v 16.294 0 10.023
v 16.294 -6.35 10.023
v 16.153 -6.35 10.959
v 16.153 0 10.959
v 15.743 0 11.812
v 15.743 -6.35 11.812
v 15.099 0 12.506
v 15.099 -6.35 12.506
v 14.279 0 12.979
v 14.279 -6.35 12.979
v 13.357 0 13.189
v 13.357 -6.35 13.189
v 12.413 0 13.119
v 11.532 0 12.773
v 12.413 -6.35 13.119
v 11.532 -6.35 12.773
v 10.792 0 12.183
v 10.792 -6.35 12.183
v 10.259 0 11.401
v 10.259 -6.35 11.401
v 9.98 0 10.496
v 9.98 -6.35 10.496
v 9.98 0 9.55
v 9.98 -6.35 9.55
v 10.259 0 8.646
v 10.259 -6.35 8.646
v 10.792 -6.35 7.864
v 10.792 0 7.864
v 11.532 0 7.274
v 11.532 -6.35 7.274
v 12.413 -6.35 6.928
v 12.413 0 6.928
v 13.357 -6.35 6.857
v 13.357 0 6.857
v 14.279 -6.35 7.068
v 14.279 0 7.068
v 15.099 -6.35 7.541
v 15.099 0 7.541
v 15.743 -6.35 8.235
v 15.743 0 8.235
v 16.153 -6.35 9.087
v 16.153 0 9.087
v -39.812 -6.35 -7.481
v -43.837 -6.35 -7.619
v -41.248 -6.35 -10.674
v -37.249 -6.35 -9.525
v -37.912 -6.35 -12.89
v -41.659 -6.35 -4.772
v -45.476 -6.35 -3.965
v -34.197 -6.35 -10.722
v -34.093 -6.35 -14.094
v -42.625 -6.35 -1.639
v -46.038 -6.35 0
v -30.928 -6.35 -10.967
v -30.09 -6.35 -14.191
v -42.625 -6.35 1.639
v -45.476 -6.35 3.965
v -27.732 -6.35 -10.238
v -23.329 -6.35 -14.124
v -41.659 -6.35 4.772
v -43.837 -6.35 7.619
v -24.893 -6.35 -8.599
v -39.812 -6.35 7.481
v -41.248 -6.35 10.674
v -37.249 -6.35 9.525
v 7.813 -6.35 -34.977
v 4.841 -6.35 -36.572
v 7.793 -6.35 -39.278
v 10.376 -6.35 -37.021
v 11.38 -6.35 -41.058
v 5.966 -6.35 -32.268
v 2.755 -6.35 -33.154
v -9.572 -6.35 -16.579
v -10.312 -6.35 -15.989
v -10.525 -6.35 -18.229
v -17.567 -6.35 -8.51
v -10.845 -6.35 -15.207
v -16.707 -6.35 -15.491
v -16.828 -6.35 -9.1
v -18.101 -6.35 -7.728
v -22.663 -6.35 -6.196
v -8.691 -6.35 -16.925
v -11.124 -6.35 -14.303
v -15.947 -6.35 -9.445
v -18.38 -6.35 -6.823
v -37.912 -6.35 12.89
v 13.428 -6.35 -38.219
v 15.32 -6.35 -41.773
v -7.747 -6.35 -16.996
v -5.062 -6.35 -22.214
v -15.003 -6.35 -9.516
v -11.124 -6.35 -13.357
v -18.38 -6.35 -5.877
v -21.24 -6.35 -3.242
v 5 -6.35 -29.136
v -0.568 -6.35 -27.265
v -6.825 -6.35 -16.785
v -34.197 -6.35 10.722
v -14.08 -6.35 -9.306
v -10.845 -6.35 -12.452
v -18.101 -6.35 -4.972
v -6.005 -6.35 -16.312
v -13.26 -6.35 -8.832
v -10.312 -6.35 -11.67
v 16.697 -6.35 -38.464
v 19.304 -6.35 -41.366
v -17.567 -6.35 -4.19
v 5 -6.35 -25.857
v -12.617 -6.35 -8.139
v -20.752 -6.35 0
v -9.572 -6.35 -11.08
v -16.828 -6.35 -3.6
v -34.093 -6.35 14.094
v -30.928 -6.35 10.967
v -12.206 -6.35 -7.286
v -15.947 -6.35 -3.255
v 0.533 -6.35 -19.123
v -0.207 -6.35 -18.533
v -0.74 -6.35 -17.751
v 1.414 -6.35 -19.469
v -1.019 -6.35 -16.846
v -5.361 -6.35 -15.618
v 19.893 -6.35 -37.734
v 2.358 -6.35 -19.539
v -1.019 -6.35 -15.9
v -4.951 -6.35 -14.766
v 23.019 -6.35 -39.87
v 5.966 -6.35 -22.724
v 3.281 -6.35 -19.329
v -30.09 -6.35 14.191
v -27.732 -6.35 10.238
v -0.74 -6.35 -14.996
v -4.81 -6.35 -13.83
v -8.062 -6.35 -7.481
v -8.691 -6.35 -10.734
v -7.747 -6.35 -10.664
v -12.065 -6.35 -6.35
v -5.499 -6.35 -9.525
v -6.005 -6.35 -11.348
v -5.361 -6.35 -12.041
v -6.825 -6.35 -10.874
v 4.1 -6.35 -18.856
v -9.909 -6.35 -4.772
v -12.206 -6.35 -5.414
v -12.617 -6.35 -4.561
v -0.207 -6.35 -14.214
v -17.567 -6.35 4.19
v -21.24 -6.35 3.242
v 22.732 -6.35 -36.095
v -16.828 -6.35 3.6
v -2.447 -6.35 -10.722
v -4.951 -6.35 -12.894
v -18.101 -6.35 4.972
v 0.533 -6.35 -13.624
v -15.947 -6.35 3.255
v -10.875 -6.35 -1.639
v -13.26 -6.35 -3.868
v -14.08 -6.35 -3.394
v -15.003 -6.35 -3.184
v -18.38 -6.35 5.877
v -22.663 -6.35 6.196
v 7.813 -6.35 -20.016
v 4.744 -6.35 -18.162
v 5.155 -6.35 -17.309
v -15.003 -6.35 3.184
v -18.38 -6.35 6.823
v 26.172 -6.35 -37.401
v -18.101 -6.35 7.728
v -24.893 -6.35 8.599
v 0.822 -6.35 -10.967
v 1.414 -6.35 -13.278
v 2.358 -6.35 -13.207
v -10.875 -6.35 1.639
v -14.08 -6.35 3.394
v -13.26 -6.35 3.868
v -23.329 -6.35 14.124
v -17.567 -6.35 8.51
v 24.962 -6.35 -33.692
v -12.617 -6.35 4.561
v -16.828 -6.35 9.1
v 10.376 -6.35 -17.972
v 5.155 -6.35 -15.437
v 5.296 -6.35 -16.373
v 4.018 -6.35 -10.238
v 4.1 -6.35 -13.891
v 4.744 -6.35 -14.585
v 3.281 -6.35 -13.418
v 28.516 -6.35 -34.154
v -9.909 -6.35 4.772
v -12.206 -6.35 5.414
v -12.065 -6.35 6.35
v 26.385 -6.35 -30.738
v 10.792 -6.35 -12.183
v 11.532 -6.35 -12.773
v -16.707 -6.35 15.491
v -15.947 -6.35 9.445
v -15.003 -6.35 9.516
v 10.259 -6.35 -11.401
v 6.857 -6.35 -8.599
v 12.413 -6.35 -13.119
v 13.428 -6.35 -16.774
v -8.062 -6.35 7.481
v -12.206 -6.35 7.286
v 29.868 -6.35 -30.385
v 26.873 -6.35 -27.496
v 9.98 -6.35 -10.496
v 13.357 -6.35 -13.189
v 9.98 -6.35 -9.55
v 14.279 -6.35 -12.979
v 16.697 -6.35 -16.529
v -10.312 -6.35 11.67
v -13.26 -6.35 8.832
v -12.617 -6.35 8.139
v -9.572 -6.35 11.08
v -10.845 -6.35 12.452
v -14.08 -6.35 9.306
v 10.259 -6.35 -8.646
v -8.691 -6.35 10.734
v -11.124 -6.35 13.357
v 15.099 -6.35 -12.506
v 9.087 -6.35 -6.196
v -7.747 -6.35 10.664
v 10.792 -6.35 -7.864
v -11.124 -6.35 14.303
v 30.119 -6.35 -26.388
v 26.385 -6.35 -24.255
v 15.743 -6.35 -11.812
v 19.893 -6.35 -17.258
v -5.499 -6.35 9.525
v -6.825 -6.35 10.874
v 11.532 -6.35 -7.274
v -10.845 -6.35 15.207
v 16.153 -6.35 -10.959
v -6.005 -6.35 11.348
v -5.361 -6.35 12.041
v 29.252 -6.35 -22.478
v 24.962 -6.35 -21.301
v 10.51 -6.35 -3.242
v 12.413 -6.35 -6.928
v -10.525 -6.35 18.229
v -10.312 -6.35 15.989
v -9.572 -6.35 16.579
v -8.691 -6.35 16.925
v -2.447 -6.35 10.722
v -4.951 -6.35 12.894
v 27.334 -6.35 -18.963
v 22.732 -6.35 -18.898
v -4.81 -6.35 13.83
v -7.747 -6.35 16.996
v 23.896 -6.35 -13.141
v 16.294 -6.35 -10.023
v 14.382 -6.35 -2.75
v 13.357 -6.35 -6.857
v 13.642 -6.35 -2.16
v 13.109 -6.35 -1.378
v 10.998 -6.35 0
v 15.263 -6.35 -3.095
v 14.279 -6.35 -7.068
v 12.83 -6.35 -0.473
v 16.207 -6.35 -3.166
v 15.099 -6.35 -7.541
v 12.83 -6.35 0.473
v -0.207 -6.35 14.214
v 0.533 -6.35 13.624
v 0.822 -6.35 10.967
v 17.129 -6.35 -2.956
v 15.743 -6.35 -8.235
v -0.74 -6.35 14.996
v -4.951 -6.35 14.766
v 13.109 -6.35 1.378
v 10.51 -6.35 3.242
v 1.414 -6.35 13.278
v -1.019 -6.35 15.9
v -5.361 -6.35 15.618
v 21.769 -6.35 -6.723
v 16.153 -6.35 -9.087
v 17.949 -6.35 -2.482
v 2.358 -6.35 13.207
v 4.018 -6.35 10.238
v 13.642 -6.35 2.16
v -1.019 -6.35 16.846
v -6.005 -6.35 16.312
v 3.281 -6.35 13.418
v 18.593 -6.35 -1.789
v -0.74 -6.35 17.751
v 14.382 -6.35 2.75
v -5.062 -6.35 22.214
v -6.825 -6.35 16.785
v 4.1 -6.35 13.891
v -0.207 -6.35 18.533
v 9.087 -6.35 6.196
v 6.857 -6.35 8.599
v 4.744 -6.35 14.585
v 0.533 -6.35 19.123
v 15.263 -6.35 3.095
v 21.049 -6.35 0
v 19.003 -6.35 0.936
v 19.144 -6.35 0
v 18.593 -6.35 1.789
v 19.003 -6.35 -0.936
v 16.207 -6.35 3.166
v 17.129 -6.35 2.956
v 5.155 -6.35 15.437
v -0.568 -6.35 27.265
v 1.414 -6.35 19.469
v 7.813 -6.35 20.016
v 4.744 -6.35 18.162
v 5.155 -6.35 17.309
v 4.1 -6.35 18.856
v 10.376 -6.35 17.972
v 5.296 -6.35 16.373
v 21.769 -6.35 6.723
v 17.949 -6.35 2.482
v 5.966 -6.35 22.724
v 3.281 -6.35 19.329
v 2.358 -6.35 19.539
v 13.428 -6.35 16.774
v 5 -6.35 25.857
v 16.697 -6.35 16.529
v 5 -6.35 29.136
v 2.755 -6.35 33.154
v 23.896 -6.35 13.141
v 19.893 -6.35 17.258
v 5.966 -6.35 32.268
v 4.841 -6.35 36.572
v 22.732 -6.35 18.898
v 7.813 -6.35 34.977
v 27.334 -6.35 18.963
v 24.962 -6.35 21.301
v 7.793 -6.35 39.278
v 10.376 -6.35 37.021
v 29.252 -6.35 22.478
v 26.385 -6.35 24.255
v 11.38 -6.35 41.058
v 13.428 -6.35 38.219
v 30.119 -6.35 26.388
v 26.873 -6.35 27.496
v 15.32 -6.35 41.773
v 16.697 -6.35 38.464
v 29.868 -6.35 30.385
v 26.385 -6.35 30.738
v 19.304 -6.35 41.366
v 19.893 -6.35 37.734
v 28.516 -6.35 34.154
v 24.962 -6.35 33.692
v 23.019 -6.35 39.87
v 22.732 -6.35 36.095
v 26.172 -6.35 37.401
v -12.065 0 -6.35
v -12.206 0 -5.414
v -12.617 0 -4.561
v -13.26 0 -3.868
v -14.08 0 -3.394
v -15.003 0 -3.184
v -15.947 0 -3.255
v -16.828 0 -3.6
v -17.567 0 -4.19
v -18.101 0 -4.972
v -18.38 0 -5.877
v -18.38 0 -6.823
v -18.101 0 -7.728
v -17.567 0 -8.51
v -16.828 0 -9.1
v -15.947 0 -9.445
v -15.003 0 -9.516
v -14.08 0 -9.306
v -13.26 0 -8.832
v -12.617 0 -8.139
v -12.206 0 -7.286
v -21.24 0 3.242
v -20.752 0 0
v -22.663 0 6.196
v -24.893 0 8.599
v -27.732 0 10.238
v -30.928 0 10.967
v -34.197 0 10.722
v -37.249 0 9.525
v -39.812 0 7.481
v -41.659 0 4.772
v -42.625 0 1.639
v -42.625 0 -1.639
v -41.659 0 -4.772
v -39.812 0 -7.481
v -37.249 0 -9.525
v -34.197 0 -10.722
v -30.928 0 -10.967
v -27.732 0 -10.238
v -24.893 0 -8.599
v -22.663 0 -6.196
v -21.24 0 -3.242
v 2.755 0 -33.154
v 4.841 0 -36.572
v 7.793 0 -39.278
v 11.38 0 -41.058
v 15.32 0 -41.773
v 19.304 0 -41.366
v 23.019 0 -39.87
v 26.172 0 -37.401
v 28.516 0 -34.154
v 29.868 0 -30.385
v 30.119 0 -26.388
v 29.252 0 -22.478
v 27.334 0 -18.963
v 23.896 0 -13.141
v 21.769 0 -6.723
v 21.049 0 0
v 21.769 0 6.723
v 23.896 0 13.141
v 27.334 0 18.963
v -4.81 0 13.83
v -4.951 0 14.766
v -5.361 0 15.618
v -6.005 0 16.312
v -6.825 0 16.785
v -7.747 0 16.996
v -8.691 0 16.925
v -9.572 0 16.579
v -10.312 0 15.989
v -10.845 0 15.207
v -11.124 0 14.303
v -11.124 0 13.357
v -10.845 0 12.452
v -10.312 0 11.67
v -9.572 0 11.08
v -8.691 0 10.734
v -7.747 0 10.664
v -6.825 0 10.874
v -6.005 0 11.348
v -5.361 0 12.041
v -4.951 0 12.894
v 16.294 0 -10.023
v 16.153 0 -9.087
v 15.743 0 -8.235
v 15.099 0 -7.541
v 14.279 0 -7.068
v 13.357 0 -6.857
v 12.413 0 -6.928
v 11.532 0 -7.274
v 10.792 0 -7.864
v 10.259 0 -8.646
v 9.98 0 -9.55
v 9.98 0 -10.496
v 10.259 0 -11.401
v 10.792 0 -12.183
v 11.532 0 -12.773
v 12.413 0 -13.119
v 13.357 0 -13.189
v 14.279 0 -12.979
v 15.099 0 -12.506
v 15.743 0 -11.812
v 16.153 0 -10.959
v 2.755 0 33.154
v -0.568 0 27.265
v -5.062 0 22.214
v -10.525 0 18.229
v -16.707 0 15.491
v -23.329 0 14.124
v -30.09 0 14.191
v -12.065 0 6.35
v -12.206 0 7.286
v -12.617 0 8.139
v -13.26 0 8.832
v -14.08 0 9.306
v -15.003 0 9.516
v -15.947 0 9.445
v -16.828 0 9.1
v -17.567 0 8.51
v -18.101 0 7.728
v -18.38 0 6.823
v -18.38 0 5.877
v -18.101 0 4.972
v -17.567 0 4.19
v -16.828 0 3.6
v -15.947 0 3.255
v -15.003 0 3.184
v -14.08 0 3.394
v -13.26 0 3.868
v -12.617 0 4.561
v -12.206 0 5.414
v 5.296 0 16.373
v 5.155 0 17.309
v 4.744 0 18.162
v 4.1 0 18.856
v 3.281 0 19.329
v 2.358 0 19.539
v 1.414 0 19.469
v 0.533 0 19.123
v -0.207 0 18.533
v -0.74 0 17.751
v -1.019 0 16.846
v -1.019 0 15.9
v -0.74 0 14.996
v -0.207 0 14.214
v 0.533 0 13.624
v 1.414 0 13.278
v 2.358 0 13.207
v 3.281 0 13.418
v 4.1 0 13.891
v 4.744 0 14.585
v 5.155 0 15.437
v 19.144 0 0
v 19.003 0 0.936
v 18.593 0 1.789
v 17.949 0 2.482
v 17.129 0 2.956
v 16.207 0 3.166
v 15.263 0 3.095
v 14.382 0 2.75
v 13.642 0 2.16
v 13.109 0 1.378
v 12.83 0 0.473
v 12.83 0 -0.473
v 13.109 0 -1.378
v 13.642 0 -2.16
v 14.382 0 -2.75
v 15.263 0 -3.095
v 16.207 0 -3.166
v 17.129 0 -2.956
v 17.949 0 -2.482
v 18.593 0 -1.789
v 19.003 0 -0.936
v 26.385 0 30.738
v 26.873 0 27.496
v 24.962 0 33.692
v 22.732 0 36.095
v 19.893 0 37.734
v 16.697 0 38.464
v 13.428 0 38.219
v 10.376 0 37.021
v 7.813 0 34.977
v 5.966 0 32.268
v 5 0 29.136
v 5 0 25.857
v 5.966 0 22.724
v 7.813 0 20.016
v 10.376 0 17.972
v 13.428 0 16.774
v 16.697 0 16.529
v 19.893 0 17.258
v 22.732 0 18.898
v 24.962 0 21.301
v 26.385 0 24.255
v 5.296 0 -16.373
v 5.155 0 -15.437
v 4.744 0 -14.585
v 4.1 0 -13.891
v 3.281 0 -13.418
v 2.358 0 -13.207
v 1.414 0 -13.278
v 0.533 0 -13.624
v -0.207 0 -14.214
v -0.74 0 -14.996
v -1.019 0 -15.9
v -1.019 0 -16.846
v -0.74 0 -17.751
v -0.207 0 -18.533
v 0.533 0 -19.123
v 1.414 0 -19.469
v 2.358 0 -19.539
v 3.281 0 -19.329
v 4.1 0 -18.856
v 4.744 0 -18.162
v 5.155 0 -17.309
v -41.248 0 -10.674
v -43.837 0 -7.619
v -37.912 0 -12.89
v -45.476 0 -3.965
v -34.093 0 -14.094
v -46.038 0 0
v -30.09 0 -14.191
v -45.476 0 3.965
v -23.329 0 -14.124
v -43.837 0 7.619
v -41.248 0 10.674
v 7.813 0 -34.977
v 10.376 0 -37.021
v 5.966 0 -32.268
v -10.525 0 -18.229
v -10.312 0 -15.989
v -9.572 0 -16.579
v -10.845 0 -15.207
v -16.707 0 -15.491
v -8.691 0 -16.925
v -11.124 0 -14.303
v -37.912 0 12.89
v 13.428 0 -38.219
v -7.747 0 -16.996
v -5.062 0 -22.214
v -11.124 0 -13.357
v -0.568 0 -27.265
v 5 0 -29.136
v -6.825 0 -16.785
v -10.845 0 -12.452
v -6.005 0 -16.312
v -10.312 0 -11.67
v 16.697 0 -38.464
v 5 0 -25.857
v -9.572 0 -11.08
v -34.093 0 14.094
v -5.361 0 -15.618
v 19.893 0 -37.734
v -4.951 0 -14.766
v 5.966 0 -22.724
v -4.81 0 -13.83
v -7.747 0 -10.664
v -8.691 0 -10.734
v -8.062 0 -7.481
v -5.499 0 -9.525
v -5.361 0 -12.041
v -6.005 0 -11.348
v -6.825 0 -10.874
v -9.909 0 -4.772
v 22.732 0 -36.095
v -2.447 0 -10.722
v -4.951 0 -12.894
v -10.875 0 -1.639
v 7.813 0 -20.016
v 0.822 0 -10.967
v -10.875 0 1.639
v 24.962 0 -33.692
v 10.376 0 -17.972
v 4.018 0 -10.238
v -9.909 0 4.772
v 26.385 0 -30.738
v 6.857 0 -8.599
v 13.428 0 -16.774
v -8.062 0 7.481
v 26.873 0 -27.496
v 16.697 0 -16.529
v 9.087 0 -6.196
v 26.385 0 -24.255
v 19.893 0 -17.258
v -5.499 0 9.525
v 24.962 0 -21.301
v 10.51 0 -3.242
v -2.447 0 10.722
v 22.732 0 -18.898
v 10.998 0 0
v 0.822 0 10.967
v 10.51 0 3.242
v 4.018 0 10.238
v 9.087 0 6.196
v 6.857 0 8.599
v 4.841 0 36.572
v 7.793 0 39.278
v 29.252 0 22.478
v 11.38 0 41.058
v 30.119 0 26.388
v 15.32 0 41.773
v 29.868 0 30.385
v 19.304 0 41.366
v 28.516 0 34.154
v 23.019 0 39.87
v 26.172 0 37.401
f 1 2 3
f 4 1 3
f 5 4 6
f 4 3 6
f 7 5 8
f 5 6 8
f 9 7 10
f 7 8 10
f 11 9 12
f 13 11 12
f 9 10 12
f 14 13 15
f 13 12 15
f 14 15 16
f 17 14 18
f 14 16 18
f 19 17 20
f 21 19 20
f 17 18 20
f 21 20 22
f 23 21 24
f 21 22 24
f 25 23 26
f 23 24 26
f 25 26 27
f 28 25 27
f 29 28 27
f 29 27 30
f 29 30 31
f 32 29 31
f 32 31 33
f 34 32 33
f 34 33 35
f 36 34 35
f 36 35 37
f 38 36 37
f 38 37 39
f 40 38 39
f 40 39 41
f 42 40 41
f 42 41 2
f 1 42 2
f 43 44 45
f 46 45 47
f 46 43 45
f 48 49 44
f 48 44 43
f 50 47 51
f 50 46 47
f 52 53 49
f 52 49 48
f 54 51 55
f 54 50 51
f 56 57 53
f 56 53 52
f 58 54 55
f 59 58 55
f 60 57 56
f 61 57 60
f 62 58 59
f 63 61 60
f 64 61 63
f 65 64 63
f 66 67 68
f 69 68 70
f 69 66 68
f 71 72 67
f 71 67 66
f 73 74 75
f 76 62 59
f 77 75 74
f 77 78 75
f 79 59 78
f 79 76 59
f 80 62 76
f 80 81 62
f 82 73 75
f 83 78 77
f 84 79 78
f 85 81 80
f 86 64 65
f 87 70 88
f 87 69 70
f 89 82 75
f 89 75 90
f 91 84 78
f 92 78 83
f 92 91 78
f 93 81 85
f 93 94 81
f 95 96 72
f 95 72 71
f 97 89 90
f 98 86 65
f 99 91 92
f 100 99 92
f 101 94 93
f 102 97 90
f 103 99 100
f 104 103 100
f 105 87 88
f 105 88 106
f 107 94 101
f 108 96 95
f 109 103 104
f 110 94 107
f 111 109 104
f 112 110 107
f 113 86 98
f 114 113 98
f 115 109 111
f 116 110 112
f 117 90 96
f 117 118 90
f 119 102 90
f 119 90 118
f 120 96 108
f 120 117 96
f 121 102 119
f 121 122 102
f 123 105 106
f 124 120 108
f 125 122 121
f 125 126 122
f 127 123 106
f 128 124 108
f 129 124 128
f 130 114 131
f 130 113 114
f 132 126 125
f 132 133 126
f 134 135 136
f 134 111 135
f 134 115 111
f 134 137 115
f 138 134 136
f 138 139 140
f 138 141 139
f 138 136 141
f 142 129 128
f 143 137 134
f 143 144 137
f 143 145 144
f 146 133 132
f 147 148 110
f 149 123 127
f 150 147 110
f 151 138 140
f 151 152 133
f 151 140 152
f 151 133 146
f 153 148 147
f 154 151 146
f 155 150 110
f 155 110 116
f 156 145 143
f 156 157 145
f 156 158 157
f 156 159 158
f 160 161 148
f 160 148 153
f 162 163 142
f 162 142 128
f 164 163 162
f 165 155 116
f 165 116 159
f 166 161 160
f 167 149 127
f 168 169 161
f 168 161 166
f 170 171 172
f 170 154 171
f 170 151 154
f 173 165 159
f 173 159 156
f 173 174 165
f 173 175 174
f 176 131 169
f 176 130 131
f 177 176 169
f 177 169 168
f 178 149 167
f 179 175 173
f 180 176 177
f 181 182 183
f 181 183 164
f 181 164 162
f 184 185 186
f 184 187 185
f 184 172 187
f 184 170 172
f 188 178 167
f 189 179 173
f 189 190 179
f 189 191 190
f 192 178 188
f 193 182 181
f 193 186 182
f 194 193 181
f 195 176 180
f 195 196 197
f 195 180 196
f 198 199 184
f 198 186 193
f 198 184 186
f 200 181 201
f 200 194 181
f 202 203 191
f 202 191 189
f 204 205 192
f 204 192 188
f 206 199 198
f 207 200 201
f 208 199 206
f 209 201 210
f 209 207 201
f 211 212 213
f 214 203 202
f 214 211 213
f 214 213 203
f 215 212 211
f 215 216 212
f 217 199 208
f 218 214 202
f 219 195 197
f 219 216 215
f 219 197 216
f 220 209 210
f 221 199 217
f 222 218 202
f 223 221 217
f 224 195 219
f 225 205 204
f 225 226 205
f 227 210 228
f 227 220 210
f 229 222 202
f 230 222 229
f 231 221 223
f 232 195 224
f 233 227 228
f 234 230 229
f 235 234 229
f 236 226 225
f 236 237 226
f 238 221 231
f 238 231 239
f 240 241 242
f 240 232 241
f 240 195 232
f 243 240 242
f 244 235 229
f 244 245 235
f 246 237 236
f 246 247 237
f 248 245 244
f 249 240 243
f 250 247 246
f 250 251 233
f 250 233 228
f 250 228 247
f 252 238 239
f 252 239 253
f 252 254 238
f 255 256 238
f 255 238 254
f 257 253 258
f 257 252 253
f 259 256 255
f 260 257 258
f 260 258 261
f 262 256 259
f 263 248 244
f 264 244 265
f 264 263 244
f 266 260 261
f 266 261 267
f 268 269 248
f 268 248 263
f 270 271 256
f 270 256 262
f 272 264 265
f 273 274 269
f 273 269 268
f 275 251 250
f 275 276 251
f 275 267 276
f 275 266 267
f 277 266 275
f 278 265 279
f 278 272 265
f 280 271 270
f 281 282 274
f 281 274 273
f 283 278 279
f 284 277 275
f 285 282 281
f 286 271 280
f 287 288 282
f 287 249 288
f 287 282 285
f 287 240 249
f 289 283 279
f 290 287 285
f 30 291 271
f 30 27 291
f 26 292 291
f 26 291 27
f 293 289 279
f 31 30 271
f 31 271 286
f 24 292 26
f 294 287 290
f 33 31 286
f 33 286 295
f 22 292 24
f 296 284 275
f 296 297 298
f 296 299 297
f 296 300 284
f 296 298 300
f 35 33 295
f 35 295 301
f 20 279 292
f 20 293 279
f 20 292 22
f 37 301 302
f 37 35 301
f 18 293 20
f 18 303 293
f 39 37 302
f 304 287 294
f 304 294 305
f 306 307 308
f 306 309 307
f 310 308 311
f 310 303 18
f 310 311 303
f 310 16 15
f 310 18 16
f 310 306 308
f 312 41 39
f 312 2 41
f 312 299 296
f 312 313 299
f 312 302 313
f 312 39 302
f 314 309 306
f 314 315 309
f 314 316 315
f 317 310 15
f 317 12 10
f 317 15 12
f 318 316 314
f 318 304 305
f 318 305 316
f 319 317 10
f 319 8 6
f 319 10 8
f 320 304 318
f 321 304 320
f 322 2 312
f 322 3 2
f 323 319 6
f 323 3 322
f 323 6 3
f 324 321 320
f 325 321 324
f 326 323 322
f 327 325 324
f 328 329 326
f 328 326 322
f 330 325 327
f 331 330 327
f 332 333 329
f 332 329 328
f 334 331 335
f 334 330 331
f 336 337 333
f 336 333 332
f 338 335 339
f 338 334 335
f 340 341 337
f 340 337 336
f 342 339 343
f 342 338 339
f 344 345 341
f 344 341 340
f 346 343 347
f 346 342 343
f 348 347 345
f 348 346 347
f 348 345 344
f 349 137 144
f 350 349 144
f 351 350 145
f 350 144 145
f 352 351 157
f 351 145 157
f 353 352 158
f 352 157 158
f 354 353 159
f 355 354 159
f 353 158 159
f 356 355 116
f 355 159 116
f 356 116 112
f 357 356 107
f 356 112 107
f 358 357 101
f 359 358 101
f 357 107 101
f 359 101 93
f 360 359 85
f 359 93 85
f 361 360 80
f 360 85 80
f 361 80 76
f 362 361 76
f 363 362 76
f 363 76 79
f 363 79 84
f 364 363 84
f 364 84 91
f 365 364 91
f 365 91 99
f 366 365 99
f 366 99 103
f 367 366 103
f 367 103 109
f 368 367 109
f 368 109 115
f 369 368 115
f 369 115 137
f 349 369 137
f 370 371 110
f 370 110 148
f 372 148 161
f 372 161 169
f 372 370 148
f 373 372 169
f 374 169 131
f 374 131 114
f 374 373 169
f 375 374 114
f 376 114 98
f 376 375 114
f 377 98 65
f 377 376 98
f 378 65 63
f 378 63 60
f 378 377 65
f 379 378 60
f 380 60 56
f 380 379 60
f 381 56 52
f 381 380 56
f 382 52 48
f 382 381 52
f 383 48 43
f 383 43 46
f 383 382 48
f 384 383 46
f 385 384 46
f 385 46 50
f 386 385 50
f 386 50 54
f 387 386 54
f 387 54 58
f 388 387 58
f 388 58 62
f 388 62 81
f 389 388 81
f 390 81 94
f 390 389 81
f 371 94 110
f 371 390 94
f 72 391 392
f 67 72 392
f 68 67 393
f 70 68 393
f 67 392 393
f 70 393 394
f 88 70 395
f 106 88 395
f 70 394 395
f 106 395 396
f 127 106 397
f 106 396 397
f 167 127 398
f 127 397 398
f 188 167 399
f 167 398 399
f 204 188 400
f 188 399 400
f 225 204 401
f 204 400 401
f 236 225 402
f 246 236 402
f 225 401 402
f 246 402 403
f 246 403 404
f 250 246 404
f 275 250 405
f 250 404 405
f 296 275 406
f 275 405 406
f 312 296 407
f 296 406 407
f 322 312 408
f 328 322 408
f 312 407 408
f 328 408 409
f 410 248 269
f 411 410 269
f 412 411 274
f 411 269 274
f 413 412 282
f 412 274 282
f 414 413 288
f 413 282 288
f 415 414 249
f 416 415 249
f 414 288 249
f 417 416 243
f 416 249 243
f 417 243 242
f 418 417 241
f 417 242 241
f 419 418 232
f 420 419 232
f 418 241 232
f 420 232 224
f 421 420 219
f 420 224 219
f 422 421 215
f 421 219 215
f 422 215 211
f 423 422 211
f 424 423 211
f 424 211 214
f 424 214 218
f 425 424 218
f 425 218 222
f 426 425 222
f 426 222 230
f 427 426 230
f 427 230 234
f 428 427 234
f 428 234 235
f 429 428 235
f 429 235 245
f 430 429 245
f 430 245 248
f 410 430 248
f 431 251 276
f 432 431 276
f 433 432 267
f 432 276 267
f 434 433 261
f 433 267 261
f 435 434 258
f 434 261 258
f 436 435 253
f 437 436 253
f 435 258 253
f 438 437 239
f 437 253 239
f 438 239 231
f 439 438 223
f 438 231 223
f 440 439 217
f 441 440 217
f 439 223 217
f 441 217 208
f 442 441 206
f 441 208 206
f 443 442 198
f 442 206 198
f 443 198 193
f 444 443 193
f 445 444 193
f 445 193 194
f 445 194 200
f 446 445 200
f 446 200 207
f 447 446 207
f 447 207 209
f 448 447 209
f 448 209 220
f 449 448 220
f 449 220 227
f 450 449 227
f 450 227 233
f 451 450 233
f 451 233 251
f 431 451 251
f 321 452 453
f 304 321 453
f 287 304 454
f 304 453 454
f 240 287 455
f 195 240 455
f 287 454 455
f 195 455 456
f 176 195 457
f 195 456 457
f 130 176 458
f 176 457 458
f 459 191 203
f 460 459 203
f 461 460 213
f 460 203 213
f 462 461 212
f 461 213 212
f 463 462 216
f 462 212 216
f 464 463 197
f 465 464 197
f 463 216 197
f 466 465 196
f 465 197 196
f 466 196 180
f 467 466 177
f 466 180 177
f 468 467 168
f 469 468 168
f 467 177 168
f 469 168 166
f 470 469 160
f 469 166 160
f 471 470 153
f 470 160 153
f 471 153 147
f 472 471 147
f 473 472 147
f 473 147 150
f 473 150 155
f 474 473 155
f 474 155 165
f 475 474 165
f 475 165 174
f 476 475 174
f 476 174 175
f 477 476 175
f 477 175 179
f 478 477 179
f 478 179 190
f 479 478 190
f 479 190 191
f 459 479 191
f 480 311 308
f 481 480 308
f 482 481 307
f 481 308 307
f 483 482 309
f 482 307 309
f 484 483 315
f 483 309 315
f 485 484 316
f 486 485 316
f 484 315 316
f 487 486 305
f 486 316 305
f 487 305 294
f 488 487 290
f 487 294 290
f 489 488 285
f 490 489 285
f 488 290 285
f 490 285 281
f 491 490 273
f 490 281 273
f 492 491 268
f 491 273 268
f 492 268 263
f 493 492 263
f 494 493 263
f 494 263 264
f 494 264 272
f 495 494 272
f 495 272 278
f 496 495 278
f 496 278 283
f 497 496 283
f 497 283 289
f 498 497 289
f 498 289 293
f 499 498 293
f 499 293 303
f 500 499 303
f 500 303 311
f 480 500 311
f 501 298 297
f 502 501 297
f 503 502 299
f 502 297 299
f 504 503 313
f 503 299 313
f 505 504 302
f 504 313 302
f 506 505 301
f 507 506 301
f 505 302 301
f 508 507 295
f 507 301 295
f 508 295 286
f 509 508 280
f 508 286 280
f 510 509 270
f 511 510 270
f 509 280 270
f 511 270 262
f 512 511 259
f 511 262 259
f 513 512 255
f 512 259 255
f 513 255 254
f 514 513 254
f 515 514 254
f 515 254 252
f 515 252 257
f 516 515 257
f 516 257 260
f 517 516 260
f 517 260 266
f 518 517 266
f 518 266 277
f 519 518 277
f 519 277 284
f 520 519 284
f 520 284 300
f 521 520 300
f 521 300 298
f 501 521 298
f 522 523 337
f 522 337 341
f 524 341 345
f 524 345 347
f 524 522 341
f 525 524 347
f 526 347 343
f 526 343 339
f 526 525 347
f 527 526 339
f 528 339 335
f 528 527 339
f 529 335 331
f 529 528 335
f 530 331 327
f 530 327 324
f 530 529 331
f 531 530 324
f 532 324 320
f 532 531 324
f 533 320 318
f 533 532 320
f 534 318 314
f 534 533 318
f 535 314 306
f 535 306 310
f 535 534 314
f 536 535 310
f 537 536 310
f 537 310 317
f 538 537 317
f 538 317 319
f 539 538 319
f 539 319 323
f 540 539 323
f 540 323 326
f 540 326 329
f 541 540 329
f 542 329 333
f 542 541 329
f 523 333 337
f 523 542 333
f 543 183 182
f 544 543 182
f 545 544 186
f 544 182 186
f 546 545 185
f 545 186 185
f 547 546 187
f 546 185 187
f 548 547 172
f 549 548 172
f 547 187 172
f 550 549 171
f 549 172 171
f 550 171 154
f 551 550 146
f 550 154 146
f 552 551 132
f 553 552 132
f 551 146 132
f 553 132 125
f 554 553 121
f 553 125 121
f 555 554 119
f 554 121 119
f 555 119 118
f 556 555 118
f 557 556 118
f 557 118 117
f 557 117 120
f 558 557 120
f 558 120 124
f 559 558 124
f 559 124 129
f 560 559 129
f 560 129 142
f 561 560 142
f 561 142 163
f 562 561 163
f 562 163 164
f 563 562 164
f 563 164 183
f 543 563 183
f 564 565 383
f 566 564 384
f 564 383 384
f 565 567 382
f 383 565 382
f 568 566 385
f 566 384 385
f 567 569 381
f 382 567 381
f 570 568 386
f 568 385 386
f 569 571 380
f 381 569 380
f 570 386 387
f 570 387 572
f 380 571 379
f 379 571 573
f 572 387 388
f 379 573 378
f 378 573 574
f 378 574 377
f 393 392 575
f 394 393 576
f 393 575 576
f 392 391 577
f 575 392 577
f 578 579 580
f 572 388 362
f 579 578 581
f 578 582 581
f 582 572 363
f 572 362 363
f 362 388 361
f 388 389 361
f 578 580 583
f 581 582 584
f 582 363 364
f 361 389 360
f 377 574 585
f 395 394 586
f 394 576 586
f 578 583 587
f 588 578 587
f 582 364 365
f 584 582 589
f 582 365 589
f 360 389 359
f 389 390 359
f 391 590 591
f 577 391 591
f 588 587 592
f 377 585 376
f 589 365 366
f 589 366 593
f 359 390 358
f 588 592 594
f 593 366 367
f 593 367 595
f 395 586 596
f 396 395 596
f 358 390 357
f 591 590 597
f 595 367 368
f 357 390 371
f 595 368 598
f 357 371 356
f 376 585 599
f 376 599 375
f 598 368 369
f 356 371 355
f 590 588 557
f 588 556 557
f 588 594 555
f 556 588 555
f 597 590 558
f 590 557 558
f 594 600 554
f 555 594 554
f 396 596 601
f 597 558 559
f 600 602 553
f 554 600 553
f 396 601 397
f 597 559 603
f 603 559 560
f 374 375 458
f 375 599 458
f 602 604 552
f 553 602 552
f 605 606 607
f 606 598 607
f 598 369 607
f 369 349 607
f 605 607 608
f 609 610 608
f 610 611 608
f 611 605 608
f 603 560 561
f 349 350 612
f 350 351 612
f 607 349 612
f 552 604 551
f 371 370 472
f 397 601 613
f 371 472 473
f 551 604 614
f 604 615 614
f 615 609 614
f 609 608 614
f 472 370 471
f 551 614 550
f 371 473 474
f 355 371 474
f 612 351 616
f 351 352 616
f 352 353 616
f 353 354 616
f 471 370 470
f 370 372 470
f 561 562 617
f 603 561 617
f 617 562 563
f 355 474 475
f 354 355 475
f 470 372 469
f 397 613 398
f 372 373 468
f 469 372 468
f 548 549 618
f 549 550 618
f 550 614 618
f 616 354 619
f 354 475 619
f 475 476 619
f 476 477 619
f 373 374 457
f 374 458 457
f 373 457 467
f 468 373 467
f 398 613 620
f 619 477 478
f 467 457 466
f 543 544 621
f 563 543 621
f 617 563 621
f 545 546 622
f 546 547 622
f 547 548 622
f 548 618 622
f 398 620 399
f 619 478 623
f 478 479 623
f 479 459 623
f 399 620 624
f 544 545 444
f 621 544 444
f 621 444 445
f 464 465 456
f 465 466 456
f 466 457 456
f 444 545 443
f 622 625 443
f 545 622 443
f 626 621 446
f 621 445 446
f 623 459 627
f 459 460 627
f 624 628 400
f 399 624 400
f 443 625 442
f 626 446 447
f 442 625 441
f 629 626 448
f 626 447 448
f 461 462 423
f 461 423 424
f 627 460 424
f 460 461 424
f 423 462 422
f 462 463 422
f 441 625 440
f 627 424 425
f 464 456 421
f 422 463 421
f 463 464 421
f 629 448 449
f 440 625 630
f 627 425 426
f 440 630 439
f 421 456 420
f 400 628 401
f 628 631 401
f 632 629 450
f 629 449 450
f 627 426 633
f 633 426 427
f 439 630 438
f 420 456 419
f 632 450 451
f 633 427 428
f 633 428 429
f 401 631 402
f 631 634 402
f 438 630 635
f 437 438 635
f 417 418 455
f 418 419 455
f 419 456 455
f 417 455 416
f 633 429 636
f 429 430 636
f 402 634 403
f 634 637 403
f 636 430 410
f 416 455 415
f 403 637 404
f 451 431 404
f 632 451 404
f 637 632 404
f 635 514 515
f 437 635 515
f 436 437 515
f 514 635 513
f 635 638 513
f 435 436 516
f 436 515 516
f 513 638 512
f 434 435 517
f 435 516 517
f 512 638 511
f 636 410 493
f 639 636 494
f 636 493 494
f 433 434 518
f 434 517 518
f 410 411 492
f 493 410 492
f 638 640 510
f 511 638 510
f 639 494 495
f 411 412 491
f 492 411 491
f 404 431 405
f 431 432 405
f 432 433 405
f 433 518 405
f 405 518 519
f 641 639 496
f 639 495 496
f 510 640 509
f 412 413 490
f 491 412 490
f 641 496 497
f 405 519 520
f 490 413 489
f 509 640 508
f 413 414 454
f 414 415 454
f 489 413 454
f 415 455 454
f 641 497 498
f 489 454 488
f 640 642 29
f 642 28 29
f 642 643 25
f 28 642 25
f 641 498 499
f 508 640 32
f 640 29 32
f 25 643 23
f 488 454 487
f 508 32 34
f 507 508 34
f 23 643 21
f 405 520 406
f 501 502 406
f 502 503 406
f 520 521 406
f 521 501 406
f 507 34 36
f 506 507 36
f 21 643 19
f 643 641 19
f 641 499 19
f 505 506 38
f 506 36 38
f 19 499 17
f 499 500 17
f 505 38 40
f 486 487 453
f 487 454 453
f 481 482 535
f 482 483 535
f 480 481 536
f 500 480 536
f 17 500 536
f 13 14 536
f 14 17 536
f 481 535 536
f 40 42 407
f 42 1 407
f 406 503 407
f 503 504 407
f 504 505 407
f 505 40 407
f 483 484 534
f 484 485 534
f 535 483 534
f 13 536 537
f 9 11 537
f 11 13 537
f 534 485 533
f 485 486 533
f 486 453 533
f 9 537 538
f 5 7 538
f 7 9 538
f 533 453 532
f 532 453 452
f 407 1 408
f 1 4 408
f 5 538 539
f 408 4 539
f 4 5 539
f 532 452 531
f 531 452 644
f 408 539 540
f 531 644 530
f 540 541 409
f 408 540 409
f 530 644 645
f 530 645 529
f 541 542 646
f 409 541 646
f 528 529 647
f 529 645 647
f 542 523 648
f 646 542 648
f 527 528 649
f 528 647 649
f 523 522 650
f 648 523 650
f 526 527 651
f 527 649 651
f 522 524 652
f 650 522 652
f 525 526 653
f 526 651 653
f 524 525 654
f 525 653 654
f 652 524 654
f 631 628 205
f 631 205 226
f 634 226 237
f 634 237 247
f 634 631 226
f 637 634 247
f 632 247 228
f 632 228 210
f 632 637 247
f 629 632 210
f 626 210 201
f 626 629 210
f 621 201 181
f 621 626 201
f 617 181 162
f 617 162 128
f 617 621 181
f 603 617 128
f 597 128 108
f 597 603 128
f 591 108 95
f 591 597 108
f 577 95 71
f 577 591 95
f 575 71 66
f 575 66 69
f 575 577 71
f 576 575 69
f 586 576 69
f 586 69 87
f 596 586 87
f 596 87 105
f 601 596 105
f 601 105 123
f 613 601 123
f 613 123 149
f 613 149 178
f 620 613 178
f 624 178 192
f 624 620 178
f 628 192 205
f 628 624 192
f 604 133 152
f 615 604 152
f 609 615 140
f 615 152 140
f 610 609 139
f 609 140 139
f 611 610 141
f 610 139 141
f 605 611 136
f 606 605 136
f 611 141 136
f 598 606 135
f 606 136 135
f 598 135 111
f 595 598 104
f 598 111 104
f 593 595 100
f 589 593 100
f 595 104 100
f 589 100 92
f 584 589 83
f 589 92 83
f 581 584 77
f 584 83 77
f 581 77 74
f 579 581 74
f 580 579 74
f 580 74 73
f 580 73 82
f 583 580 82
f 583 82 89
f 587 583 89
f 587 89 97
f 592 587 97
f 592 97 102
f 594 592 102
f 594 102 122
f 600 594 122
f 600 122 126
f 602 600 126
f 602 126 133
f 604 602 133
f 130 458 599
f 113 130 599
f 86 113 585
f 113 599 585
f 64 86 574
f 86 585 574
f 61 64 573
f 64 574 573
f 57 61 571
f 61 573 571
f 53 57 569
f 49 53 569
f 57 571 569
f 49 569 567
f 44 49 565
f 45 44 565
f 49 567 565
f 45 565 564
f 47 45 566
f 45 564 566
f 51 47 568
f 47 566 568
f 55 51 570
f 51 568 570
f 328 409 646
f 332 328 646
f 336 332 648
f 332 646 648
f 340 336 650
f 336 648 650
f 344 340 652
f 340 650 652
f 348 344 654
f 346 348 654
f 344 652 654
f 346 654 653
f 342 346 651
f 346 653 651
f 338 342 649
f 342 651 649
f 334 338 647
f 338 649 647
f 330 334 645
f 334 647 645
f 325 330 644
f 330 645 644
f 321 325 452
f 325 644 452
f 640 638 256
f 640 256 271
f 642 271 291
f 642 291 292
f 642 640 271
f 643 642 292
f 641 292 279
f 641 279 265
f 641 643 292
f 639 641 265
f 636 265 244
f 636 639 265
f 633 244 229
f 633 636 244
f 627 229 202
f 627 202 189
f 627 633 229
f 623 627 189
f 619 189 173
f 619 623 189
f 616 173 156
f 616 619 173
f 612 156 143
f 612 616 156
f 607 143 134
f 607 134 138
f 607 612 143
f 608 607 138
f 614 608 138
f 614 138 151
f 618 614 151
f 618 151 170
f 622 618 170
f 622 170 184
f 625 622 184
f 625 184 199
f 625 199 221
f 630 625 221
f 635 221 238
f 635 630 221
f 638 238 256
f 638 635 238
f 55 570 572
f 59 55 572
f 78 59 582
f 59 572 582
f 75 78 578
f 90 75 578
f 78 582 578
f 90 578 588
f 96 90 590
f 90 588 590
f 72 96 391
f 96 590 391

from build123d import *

# Parameters (mm, degrees)
F2_R     = 10.9982
F2_R_2   = 14.2875
F3_DEPTH = 6.35
F4_R     = 3.175
F5_R     = 3.175
F6_DEPTH = 6.351


with BuildPart() as f3:
    # F2 (on Front) → F3 (new body)
    with BuildSketch(Plane.XZ):
        with BuildLine():
            ThreePointArc((30.1625, 27.4963065702), (18.7633086309, 41.4888163344), (2.7552797722, 33.1536555423))
            ThreePointArc((2.7552797722, 33.1536555423), (8.73125, 15.1229686136), (27.3342680419, 18.9629700484))
            ThreePointArc((27.3342680419, 18.9629700484), (29.437023234, 23.0014003364), (30.1625, 27.4963065702))
        make_face()
        with Locations((15.875, 27.4963065702)):
            Circle(F2_R, mode=Mode.SUBTRACT)
        with BuildLine():
            ThreePointArc((-30.0895478141, 14.1906854939), (-21.0762853969, 9.4976035305), (-17.4625, 0))
            ThreePointArc((-17.4625, 0), (-21.0762853969, -9.4976035305), (-30.0895478141, -14.1906854939))
            ThreePointArc((-30.0895478141, -14.1906854939), (-10.5246540675, -18.229235577), (2.7552797722, -33.1536555423))
            ThreePointArc((2.7552797722, -33.1536555423), (8.73125, -15.1229686136), (27.3342680419, -18.9629700484))
            ThreePointArc((27.3342680419, -18.9629700484), (21.049308135, 0), (27.3342680419, 18.9629700484))
            ThreePointArc((27.3342680419, 18.9629700484), (8.73125, 15.1229686136), (2.7552797722, 33.1536555423))
            ThreePointArc((2.7552797722, 33.1536555423), (-10.5246540675, 18.229235577), (-30.0895478141, 14.1906854939))
        make_face()
        Circle(F2_R_2, mode=Mode.SUBTRACT)
        Circle(F2_R_2)
        Circle(F2_R, mode=Mode.SUBTRACT)
        with BuildLine():
            ThreePointArc((-30.0895478141, -14.1906854939), (-21.0762853969, -9.4976035305), (-17.4625, 0))
            ThreePointArc((-17.4625, 0), (-21.0762853969, 9.4976035305), (-30.0895478141, 14.1906854939))
            ThreePointArc((-30.0895478141, 14.1906854939), (-46.0375, 0), (-30.0895478141, -14.1906854939))
        make_face()
        with Locations((-31.75, 0)):
            Circle(F2_R, mode=Mode.SUBTRACT)
        with BuildLine():
            ThreePointArc((27.3342680419, -18.9629700484), (8.73125, -15.1229686136), (2.7552797722, -33.1536555423))
            ThreePointArc((2.7552797722, -33.1536555423), (18.7633086309, -41.4888163344), (30.1625, -27.4963065702))
            ThreePointArc((30.1625, -27.4963065702), (29.437023234, -23.0014003364), (27.3342680419, -18.9629700484))
        make_face()
        with Locations((15.875, -27.4963065702)):
            Circle(F2_R, mode=Mode.SUBTRACT)
    extrude(amount=F3_DEPTH)

    # F4 (on face) + F5 (on face) → F6 (cut, through all)
    with BuildSketch(Plane.XZ.offset(6.35)):
        with Locations((-15.24, 6.35)):
            Circle(F4_R)
        with Locations((2.120738686, 16.3732271537)):
            Circle(F4_R)
        with Locations((13.119261314, 10.0232271537)):
            Circle(F4_R)
        with Locations((13.119261314, -10.0232271537)):
            Circle(F4_R)
        with Locations((2.120738686, -16.3732271537)):
            Circle(F4_R)
        with Locations((-15.24, -6.35)):
            Circle(F4_R)
    with BuildSketch(Plane.XZ.offset(6.35)):
        with Locations((-7.9846540675, 13.8298265258)):
            Circle(F5_R)
        with Locations((15.969308135, 0)):
            Circle(F5_R)
        with Locations((-7.9846540675, -13.8298265258)):
            Circle(F5_R)
    extrude(amount=-F6_DEPTH, mode=Mode.SUBTRACT)


solid = f3.part
